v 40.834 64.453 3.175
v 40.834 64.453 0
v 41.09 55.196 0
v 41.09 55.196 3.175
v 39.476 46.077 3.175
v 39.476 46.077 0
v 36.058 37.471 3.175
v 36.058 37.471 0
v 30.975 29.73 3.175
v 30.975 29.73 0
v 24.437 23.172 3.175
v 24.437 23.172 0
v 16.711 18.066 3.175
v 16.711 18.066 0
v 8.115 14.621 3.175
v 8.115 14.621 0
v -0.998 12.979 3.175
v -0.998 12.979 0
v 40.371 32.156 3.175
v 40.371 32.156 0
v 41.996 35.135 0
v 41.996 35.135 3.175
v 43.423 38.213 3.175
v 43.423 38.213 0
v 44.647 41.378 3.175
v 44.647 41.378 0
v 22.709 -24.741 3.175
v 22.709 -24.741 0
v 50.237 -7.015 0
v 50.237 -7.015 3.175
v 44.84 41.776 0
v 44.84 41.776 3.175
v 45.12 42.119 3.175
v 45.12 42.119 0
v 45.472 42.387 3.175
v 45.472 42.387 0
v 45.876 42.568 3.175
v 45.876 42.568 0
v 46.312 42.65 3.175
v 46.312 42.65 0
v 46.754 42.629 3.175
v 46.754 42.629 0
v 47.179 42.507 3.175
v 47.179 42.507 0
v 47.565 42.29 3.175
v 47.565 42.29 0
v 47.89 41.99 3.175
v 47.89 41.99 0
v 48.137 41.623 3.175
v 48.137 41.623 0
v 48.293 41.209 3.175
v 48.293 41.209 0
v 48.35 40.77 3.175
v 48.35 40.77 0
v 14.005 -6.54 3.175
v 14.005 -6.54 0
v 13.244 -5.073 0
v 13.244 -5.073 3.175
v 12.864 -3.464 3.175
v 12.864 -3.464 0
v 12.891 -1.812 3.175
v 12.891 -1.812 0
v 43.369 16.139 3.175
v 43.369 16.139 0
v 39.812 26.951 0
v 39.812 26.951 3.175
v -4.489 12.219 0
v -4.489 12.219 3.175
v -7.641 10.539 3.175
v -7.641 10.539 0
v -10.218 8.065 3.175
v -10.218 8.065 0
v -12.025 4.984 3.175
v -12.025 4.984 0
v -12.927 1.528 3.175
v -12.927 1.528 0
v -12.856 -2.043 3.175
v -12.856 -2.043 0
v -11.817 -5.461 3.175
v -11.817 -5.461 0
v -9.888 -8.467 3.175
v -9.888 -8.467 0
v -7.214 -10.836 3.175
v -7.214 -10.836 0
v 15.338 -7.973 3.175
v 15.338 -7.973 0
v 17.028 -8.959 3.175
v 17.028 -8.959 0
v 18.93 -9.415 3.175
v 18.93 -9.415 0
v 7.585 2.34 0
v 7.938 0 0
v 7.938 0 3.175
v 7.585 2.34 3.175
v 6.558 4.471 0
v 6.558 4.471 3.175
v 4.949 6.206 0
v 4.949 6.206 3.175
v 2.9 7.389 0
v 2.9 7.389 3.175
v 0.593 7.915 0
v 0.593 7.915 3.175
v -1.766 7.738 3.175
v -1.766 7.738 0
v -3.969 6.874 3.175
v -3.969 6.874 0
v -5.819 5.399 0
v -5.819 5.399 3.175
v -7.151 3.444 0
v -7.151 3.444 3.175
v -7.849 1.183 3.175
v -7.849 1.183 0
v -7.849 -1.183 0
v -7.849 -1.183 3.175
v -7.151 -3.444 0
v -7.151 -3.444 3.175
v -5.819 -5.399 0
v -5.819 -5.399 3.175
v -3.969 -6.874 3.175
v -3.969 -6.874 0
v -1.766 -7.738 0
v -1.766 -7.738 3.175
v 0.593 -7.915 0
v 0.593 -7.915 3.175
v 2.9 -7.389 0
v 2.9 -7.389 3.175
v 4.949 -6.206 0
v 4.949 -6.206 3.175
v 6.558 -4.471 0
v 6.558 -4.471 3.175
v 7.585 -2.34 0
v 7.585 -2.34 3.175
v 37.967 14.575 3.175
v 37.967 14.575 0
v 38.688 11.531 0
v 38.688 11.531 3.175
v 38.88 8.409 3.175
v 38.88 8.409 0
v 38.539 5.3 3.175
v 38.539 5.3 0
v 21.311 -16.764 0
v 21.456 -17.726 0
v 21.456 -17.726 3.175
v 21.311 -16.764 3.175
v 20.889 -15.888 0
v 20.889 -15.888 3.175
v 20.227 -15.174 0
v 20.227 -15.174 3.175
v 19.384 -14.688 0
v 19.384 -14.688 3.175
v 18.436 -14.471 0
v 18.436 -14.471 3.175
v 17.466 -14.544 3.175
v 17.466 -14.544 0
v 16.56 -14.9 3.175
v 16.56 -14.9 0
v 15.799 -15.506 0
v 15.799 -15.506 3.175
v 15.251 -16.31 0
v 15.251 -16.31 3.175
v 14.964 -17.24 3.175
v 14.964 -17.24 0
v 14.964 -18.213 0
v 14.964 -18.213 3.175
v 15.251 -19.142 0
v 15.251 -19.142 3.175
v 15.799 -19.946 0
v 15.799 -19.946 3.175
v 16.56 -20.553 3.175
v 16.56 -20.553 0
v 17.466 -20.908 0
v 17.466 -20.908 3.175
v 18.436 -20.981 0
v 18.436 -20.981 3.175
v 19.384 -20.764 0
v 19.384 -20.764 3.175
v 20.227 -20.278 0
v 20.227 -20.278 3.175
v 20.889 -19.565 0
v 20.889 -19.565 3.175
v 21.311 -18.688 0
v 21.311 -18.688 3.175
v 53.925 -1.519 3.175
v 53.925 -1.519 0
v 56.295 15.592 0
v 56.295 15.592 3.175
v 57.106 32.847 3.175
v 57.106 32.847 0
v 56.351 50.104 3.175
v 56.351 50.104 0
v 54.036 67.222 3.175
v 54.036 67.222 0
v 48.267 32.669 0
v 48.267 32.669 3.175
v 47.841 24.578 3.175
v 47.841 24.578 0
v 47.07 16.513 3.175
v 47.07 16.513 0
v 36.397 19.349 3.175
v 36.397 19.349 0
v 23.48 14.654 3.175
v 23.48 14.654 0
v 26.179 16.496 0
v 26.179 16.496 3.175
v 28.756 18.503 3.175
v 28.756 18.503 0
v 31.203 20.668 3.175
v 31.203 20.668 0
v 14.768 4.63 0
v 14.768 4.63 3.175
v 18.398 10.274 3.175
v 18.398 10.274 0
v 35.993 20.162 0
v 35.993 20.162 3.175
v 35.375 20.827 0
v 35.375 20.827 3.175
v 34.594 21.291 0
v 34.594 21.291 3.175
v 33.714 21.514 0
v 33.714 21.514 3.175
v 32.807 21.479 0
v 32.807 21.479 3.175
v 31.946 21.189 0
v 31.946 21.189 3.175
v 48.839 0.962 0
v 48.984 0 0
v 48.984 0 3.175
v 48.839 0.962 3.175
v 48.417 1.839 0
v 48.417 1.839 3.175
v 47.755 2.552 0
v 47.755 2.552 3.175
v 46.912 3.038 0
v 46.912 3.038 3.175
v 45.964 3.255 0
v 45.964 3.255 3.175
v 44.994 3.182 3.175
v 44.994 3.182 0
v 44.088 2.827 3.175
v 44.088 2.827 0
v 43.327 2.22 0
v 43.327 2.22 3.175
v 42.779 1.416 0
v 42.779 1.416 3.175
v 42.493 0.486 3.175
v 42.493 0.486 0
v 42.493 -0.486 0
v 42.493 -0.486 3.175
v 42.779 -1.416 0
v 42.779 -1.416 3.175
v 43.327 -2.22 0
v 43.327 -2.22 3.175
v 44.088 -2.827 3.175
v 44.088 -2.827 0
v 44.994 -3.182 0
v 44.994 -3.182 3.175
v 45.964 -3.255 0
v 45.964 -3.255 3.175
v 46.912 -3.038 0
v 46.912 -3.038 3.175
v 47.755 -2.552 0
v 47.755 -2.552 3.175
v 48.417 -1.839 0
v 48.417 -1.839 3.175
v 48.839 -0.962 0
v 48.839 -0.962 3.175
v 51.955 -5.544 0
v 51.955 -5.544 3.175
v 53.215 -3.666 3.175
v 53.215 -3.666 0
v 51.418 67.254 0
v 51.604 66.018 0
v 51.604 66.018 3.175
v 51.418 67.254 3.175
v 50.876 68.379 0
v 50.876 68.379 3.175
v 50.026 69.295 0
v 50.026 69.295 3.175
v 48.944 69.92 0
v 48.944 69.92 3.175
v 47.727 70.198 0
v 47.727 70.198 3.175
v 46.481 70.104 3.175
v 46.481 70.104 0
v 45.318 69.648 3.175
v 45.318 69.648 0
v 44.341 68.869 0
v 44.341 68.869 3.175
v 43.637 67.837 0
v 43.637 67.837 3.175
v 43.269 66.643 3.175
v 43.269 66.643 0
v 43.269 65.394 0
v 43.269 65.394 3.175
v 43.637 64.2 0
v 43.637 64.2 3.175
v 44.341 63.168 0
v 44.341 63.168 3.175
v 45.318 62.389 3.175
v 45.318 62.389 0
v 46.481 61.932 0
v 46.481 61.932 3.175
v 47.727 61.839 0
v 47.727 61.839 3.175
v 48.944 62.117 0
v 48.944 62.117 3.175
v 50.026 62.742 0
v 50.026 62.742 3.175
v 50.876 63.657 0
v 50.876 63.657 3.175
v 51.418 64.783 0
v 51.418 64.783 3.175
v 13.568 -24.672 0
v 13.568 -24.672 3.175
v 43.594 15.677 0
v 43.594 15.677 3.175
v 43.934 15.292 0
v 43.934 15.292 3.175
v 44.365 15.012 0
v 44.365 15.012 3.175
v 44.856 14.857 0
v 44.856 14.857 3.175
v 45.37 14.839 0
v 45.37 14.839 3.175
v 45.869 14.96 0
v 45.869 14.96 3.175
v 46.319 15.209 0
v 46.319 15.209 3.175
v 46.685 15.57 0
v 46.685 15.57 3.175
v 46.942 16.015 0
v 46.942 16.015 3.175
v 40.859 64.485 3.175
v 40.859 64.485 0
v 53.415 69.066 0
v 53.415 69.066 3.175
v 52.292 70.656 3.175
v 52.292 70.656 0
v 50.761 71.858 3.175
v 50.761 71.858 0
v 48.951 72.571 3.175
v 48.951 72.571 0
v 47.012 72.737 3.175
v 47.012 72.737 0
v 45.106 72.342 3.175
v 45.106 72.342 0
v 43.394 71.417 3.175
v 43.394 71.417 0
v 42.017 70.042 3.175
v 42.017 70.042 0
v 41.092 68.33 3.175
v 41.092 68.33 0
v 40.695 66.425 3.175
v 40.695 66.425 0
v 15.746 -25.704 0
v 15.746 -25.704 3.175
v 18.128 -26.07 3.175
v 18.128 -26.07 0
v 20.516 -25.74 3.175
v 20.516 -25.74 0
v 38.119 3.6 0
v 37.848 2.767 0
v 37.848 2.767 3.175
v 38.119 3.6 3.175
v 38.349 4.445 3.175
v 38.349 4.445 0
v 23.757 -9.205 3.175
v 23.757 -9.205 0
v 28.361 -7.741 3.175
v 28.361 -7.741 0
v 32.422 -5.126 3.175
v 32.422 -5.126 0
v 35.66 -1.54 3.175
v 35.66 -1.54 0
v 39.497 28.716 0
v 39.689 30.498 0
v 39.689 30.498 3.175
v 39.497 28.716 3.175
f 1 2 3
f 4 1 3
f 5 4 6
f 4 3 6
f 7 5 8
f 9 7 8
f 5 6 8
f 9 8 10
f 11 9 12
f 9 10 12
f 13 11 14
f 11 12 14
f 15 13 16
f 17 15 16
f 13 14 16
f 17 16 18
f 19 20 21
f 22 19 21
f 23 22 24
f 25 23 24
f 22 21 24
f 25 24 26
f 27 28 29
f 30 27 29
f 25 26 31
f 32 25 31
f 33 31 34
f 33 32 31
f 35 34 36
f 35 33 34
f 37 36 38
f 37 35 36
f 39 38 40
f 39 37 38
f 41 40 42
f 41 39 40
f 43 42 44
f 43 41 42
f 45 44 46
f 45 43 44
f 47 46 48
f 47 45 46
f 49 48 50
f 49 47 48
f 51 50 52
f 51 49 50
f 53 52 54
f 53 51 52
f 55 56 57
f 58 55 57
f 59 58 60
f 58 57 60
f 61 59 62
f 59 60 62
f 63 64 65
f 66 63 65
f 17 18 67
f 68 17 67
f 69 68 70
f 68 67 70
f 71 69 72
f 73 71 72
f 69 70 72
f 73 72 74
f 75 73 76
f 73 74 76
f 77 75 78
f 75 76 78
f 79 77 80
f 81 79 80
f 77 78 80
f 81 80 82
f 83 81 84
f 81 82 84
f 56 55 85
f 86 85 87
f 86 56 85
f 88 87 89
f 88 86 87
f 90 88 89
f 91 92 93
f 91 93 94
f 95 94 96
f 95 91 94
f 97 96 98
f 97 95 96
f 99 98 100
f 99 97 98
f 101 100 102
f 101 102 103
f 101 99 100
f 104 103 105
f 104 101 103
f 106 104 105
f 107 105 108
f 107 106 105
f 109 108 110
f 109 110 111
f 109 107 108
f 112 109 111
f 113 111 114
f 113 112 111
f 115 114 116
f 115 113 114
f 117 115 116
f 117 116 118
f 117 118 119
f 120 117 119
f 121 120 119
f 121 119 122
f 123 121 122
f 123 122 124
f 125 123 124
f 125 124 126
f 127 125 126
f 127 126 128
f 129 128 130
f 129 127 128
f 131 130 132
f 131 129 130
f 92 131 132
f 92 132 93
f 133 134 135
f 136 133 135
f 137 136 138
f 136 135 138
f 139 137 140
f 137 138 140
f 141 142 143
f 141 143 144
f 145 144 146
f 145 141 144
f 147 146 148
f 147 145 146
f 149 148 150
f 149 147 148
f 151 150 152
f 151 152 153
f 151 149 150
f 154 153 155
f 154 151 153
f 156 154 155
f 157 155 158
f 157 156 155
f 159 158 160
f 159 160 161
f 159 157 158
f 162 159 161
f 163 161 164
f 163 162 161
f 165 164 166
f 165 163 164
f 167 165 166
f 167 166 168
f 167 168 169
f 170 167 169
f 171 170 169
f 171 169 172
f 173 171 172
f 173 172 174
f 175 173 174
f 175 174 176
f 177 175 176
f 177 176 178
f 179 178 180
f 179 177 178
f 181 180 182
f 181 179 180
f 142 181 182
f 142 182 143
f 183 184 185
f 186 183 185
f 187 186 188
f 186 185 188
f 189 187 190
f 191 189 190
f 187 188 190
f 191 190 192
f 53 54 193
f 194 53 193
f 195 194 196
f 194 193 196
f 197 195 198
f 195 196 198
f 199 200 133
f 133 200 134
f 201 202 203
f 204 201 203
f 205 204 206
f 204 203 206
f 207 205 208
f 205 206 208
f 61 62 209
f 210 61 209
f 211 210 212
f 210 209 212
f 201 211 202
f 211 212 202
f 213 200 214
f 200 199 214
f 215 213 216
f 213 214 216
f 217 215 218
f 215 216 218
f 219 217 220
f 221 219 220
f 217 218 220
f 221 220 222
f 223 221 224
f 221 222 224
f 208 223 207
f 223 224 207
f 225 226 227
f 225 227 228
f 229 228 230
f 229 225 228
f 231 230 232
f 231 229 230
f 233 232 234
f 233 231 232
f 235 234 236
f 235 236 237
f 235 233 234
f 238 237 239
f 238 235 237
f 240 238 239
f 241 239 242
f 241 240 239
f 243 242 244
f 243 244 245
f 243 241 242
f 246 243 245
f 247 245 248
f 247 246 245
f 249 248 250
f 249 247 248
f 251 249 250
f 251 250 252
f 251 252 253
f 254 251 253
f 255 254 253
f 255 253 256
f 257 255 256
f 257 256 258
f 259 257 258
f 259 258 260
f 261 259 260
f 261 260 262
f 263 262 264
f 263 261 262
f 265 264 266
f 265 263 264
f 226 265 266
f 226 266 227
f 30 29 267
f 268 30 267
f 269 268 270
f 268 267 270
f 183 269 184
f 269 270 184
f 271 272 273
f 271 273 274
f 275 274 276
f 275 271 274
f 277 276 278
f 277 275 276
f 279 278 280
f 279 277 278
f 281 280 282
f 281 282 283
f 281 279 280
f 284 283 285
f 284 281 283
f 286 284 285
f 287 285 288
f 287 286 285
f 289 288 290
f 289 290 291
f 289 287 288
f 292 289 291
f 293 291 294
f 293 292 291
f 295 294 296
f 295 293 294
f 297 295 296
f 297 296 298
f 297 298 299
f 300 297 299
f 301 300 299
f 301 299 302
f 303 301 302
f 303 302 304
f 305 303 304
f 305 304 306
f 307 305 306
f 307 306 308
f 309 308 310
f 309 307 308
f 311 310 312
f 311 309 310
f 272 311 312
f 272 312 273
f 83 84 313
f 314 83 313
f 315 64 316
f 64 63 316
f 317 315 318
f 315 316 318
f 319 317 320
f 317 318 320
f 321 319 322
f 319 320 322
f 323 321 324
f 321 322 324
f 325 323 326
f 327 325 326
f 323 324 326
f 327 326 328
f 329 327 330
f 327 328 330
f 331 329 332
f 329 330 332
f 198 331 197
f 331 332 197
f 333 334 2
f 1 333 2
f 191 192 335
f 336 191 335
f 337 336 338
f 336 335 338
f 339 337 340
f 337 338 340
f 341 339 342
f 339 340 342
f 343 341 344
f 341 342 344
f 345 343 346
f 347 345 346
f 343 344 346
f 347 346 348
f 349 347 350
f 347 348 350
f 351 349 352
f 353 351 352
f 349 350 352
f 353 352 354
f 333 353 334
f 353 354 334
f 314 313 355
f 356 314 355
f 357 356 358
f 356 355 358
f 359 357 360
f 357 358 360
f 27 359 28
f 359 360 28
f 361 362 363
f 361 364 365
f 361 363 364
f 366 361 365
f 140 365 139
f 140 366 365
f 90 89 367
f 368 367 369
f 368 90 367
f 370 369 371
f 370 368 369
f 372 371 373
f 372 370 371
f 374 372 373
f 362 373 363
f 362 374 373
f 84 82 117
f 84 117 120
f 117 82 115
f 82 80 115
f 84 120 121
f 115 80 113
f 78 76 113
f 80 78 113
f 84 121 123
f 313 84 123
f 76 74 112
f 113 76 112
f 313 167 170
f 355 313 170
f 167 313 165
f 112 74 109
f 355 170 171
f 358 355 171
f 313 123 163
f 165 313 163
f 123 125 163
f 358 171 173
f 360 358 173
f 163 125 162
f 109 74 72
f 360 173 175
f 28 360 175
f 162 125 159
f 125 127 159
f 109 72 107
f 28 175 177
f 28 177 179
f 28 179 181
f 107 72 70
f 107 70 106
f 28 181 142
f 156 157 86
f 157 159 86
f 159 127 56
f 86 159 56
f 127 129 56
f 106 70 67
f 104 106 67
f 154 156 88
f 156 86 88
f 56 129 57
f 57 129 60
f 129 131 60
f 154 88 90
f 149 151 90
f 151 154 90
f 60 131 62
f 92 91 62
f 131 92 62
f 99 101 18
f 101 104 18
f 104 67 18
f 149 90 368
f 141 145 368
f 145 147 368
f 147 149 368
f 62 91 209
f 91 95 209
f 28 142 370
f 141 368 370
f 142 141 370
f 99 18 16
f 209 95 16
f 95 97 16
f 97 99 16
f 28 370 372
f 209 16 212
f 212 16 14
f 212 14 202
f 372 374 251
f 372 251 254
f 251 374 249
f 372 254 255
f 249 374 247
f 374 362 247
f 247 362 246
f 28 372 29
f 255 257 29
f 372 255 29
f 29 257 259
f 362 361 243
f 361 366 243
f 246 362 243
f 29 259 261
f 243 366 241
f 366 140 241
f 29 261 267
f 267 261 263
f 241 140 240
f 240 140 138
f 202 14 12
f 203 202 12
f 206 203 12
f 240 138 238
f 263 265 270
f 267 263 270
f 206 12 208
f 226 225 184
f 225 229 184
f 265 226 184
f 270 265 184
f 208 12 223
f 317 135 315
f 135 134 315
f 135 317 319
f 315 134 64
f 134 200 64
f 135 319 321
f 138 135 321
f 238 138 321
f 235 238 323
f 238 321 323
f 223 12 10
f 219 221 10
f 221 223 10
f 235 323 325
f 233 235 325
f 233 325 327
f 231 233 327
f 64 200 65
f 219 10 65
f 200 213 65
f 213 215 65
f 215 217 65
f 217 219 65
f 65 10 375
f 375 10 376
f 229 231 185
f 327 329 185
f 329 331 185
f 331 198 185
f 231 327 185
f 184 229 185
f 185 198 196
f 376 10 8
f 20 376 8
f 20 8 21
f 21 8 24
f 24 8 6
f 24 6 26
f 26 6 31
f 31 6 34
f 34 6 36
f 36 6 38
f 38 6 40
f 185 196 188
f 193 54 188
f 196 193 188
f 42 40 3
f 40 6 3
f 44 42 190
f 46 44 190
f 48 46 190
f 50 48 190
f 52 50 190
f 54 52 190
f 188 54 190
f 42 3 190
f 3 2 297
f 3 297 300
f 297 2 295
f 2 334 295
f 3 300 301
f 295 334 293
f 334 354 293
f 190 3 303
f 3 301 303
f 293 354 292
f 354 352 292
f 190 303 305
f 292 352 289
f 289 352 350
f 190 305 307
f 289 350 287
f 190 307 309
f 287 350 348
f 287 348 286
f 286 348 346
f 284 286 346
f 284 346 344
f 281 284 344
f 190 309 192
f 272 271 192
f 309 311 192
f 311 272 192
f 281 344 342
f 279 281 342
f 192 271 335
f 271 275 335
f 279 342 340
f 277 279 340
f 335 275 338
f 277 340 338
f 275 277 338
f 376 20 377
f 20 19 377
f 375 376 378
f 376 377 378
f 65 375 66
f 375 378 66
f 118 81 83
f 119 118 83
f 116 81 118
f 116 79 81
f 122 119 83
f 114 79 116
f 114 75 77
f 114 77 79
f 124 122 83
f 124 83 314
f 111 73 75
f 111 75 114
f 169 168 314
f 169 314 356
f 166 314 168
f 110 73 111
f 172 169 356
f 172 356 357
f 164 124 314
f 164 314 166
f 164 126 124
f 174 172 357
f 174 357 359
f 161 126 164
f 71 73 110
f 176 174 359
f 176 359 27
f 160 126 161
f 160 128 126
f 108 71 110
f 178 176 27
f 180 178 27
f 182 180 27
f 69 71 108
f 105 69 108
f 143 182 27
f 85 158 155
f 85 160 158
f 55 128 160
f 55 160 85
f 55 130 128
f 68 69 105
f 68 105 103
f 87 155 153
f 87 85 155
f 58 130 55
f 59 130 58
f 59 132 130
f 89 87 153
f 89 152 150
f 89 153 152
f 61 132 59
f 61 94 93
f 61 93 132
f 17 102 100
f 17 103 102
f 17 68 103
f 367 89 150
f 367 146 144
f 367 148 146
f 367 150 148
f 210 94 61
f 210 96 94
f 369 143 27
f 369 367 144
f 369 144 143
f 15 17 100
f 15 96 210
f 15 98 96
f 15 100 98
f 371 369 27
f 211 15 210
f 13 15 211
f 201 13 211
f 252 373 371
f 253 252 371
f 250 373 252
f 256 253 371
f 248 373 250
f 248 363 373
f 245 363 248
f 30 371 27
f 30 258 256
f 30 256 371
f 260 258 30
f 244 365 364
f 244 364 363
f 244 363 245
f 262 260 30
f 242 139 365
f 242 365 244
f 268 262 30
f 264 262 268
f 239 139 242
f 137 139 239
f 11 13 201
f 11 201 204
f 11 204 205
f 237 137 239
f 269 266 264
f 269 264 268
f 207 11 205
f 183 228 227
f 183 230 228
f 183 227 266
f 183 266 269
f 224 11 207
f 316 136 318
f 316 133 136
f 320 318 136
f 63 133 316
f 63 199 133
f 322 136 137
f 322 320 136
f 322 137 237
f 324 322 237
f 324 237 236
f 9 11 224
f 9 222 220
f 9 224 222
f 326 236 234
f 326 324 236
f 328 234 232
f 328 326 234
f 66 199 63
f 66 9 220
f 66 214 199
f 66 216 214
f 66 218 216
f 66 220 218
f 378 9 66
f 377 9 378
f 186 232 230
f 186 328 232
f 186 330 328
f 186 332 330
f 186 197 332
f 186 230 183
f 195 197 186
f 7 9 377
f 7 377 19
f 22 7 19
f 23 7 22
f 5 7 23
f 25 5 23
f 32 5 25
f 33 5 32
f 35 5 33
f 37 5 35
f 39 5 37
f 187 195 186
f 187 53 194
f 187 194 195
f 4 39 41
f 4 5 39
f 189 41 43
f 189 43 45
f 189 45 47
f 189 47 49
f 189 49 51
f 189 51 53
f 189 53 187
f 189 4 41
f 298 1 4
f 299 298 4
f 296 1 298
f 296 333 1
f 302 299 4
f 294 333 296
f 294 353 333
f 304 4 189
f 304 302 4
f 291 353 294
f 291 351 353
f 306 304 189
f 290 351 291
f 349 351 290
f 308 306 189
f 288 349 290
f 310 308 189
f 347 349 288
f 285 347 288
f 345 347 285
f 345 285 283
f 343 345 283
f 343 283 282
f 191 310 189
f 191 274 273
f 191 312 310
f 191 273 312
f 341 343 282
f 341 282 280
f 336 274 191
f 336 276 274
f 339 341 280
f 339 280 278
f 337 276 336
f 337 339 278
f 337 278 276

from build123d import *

# Parameters (mm, degrees)
SKETCH2_R           = 7.9375
SKETCH2_R_2         = 3.2639
SKETCH2_R_3         = 4.191
BOSS_EXTRUDE1_DEPTH = 3.175
FILLET3_R           = 1.905
FILLET4_R           = 6.35
BOSS_EXTRUDE2_START = -3.175
BOSS_EXTRUDE2_DEPTH = 3.175
CUT_EXTRUDE1_DEPTH  = 12.065
FILLET5_R           = 3.175


with BuildPart() as part:
    # Sketch2 → Boss-Extrude1 (new body)
    with BuildSketch(Plane.XY):
        with BuildLine():
            Line((22.709173353, -24.74146542), (50.237344688, -7.01528789))
            ThreePointArc((50.237344688, -7.01528789), (52.649254226, -4.648236557), (53.924522204, -1.51871084))
            ThreePointArc((53.924522204, -1.51871084), (57.106411985, 32.846575037), (54.035830718, 67.22198524))
            ThreePointArc((54.035830718, 67.22198524), (46.044632155, 72.608660166), (40.859194914, 64.485436554))
            Line((40.859194914, 64.485436554), (40.833827284, 64.453346951))
            ThreePointArc((40.833827284, 64.453346951), (30.975387354, 29.729811242), (-0.998479041, 12.979150429))
            ThreePointArc((-0.998479041, 12.979150429), (-12.595568055, 3.287395871), (-7.214067166, -10.835706769))
            Line((-7.214067166, -10.835706769), (13.567787564, -24.671601284))
            ThreePointArc((13.567787564, -24.671601284), (18.128061271, -26.069833859), (22.709173353, -24.74146542))
        make_face()
        Circle(SKETCH2_R, mode=Mode.SUBTRACT)
        with Locations((18.191828664, -17.726177531)):
            Circle(SKETCH2_R_2, mode=Mode.SUBTRACT)
        with Locations((45.72, 0)):
            Circle(SKETCH2_R_2, mode=Mode.SUBTRACT)
        with BuildLine():
            Line((40.584986991, 6.617553577), (21.318666843, -5.788581474))
            Line((21.318666843, -5.788581474), (11.074870198, -6.841239387))
            ThreePointArc((11.074870198, -6.841239387), (12.976194182, 1.036190528), (9.848859751, 8.512066016))
            ThreePointArc((9.848859751, 8.512066016), (23.445327069, 14.632175726), (34.749899024, 24.354640398))
            Line((34.749899024, 24.354640398), (40.584986991, 6.617553577))
        make_face(mode=Mode.SUBTRACT)
        with BuildLine():
            ThreePointArc((47.523781163, 56.501393309), (48.257752726, 32.370804269), (45.933946154, 8.34115665))
            Line((45.933946154, 8.34115665), (38.882442516, 29.775817606))
            ThreePointArc((38.882442516, 29.775817606), (45.039190515, 42.544935267), (47.523781163, 56.501393309))
        make_face(mode=Mode.SUBTRACT)
        with Locations((47.413333333, 66.018287029)):
            Circle(SKETCH2_R_3, mode=Mode.SUBTRACT)
    extrude(amount=BOSS_EXTRUDE1_DEPTH)

    # Fillet3
    fillet3_edges = [part.edges().sort_by_distance(p)[0] for p in [
        (45.933946154, 8.34115665, 1.5875),
        (47.523781163, 56.501393309, 1.5875),
    ]]
    fillet(fillet3_edges, radius=FILLET3_R)

    # Fillet4
    fillet4_edges = [part.edges().sort_by_distance(p)[0] for p in [
        (38.882442516, 29.775817606, 1.5875),
    ]]
    fillet(fillet4_edges, radius=FILLET4_R)

    # Sketch3 → Boss-Extrude2 (add)
    with BuildSketch(Plane.XY.offset(3.175).offset(BOSS_EXTRUDE2_START)):
        with BuildLine():
            ThreePointArc((37.967247274, 14.574773228), (38.850624387, 9.974362656), (38.539279751, 5.300264126))
            Line((38.539279751, 5.300264126), (40.584986991, 6.617553577))
            Line((40.584986991, 6.617553577), (37.967247274, 14.574773228))
        make_face()
        with BuildLine():
            ThreePointArc((14.005375904, -6.540099084), (13.004272705, -4.28056917), (12.890798124, -1.811802966))
            ThreePointArc((12.890798124, -1.811802966), (12.243860592, -4.42076736), (11.074870198, -6.841239387))
            Line((11.074870198, -6.841239387), (14.005375904, -6.540099084))
        make_face()
        with BuildLine():
            ThreePointArc((9.848859751, 8.512066016), (12.486736073, 3.679229335), (12.890798124, -1.811802966))
            ThreePointArc((12.890798124, -1.811802966), (16.379474961, 7.582660649), (23.480082515, 14.654307207))
            ThreePointArc((23.480082515, 14.654307207), (16.886076234, 11.091387544), (9.848859751, 8.512066016))
        make_face()
    extrude(amount=BOSS_EXTRUDE2_DEPTH)

    # Sketch4 → Cut-Extrude1 (cut)
    with BuildSketch(Plane.XY):
        with BuildLine():
            Line((38.539279751, 5.300264126), (24.727997063, 1.47053375))
            ThreePointArc((24.727997063, 1.47053375), (25.836206507, -0.508508416), (26.220294441, -2.743953008))
            ThreePointArc((26.220294441, -2.743953008), (24.044282761, -7.68479904), (18.930249644, -9.41501626))
            ThreePointArc((18.930249644, -9.41501626), (30.477911362, -6.56779892), (37.848176473, 2.766778194))
            ThreePointArc((37.848176473, 2.766778194), (38.239149826, 4.021130685), (38.539279751, 5.300264126))
        make_face()
        with BuildLine():
            ThreePointArc((24.727997063, 1.47053375), (17.733373474, 3.709866579), (12.890798123, -1.811802972))
            Line((12.890798123, -1.811802972), (24.727997063, 1.47053375))
        make_face()
        with BuildLine():
            Line((24.727997063, 1.47053375), (12.890798123, -1.811802972))
            ThreePointArc((12.890798123, -1.811802972), (14.27873169, -6.909589201), (18.930249644, -9.41501626))
            ThreePointArc((18.930249644, -9.41501626), (24.044282761, -7.68479904), (26.220294441, -2.743953008))
            ThreePointArc((26.220294441, -2.743953008), (25.836206507, -0.508508416), (24.727997063, 1.47053375))
        make_face()
    extrude(amount=CUT_EXTRUDE1_DEPTH, mode=Mode.SUBTRACT)

    # Fillet5
    fillet5_edges = [part.edges().sort_by_distance(p)[0] for p in [
        (34.749899024, 24.354640398, 1.5875),
    ]]
    fillet(fillet5_edges, radius=FILLET5_R)


solid = part.part
